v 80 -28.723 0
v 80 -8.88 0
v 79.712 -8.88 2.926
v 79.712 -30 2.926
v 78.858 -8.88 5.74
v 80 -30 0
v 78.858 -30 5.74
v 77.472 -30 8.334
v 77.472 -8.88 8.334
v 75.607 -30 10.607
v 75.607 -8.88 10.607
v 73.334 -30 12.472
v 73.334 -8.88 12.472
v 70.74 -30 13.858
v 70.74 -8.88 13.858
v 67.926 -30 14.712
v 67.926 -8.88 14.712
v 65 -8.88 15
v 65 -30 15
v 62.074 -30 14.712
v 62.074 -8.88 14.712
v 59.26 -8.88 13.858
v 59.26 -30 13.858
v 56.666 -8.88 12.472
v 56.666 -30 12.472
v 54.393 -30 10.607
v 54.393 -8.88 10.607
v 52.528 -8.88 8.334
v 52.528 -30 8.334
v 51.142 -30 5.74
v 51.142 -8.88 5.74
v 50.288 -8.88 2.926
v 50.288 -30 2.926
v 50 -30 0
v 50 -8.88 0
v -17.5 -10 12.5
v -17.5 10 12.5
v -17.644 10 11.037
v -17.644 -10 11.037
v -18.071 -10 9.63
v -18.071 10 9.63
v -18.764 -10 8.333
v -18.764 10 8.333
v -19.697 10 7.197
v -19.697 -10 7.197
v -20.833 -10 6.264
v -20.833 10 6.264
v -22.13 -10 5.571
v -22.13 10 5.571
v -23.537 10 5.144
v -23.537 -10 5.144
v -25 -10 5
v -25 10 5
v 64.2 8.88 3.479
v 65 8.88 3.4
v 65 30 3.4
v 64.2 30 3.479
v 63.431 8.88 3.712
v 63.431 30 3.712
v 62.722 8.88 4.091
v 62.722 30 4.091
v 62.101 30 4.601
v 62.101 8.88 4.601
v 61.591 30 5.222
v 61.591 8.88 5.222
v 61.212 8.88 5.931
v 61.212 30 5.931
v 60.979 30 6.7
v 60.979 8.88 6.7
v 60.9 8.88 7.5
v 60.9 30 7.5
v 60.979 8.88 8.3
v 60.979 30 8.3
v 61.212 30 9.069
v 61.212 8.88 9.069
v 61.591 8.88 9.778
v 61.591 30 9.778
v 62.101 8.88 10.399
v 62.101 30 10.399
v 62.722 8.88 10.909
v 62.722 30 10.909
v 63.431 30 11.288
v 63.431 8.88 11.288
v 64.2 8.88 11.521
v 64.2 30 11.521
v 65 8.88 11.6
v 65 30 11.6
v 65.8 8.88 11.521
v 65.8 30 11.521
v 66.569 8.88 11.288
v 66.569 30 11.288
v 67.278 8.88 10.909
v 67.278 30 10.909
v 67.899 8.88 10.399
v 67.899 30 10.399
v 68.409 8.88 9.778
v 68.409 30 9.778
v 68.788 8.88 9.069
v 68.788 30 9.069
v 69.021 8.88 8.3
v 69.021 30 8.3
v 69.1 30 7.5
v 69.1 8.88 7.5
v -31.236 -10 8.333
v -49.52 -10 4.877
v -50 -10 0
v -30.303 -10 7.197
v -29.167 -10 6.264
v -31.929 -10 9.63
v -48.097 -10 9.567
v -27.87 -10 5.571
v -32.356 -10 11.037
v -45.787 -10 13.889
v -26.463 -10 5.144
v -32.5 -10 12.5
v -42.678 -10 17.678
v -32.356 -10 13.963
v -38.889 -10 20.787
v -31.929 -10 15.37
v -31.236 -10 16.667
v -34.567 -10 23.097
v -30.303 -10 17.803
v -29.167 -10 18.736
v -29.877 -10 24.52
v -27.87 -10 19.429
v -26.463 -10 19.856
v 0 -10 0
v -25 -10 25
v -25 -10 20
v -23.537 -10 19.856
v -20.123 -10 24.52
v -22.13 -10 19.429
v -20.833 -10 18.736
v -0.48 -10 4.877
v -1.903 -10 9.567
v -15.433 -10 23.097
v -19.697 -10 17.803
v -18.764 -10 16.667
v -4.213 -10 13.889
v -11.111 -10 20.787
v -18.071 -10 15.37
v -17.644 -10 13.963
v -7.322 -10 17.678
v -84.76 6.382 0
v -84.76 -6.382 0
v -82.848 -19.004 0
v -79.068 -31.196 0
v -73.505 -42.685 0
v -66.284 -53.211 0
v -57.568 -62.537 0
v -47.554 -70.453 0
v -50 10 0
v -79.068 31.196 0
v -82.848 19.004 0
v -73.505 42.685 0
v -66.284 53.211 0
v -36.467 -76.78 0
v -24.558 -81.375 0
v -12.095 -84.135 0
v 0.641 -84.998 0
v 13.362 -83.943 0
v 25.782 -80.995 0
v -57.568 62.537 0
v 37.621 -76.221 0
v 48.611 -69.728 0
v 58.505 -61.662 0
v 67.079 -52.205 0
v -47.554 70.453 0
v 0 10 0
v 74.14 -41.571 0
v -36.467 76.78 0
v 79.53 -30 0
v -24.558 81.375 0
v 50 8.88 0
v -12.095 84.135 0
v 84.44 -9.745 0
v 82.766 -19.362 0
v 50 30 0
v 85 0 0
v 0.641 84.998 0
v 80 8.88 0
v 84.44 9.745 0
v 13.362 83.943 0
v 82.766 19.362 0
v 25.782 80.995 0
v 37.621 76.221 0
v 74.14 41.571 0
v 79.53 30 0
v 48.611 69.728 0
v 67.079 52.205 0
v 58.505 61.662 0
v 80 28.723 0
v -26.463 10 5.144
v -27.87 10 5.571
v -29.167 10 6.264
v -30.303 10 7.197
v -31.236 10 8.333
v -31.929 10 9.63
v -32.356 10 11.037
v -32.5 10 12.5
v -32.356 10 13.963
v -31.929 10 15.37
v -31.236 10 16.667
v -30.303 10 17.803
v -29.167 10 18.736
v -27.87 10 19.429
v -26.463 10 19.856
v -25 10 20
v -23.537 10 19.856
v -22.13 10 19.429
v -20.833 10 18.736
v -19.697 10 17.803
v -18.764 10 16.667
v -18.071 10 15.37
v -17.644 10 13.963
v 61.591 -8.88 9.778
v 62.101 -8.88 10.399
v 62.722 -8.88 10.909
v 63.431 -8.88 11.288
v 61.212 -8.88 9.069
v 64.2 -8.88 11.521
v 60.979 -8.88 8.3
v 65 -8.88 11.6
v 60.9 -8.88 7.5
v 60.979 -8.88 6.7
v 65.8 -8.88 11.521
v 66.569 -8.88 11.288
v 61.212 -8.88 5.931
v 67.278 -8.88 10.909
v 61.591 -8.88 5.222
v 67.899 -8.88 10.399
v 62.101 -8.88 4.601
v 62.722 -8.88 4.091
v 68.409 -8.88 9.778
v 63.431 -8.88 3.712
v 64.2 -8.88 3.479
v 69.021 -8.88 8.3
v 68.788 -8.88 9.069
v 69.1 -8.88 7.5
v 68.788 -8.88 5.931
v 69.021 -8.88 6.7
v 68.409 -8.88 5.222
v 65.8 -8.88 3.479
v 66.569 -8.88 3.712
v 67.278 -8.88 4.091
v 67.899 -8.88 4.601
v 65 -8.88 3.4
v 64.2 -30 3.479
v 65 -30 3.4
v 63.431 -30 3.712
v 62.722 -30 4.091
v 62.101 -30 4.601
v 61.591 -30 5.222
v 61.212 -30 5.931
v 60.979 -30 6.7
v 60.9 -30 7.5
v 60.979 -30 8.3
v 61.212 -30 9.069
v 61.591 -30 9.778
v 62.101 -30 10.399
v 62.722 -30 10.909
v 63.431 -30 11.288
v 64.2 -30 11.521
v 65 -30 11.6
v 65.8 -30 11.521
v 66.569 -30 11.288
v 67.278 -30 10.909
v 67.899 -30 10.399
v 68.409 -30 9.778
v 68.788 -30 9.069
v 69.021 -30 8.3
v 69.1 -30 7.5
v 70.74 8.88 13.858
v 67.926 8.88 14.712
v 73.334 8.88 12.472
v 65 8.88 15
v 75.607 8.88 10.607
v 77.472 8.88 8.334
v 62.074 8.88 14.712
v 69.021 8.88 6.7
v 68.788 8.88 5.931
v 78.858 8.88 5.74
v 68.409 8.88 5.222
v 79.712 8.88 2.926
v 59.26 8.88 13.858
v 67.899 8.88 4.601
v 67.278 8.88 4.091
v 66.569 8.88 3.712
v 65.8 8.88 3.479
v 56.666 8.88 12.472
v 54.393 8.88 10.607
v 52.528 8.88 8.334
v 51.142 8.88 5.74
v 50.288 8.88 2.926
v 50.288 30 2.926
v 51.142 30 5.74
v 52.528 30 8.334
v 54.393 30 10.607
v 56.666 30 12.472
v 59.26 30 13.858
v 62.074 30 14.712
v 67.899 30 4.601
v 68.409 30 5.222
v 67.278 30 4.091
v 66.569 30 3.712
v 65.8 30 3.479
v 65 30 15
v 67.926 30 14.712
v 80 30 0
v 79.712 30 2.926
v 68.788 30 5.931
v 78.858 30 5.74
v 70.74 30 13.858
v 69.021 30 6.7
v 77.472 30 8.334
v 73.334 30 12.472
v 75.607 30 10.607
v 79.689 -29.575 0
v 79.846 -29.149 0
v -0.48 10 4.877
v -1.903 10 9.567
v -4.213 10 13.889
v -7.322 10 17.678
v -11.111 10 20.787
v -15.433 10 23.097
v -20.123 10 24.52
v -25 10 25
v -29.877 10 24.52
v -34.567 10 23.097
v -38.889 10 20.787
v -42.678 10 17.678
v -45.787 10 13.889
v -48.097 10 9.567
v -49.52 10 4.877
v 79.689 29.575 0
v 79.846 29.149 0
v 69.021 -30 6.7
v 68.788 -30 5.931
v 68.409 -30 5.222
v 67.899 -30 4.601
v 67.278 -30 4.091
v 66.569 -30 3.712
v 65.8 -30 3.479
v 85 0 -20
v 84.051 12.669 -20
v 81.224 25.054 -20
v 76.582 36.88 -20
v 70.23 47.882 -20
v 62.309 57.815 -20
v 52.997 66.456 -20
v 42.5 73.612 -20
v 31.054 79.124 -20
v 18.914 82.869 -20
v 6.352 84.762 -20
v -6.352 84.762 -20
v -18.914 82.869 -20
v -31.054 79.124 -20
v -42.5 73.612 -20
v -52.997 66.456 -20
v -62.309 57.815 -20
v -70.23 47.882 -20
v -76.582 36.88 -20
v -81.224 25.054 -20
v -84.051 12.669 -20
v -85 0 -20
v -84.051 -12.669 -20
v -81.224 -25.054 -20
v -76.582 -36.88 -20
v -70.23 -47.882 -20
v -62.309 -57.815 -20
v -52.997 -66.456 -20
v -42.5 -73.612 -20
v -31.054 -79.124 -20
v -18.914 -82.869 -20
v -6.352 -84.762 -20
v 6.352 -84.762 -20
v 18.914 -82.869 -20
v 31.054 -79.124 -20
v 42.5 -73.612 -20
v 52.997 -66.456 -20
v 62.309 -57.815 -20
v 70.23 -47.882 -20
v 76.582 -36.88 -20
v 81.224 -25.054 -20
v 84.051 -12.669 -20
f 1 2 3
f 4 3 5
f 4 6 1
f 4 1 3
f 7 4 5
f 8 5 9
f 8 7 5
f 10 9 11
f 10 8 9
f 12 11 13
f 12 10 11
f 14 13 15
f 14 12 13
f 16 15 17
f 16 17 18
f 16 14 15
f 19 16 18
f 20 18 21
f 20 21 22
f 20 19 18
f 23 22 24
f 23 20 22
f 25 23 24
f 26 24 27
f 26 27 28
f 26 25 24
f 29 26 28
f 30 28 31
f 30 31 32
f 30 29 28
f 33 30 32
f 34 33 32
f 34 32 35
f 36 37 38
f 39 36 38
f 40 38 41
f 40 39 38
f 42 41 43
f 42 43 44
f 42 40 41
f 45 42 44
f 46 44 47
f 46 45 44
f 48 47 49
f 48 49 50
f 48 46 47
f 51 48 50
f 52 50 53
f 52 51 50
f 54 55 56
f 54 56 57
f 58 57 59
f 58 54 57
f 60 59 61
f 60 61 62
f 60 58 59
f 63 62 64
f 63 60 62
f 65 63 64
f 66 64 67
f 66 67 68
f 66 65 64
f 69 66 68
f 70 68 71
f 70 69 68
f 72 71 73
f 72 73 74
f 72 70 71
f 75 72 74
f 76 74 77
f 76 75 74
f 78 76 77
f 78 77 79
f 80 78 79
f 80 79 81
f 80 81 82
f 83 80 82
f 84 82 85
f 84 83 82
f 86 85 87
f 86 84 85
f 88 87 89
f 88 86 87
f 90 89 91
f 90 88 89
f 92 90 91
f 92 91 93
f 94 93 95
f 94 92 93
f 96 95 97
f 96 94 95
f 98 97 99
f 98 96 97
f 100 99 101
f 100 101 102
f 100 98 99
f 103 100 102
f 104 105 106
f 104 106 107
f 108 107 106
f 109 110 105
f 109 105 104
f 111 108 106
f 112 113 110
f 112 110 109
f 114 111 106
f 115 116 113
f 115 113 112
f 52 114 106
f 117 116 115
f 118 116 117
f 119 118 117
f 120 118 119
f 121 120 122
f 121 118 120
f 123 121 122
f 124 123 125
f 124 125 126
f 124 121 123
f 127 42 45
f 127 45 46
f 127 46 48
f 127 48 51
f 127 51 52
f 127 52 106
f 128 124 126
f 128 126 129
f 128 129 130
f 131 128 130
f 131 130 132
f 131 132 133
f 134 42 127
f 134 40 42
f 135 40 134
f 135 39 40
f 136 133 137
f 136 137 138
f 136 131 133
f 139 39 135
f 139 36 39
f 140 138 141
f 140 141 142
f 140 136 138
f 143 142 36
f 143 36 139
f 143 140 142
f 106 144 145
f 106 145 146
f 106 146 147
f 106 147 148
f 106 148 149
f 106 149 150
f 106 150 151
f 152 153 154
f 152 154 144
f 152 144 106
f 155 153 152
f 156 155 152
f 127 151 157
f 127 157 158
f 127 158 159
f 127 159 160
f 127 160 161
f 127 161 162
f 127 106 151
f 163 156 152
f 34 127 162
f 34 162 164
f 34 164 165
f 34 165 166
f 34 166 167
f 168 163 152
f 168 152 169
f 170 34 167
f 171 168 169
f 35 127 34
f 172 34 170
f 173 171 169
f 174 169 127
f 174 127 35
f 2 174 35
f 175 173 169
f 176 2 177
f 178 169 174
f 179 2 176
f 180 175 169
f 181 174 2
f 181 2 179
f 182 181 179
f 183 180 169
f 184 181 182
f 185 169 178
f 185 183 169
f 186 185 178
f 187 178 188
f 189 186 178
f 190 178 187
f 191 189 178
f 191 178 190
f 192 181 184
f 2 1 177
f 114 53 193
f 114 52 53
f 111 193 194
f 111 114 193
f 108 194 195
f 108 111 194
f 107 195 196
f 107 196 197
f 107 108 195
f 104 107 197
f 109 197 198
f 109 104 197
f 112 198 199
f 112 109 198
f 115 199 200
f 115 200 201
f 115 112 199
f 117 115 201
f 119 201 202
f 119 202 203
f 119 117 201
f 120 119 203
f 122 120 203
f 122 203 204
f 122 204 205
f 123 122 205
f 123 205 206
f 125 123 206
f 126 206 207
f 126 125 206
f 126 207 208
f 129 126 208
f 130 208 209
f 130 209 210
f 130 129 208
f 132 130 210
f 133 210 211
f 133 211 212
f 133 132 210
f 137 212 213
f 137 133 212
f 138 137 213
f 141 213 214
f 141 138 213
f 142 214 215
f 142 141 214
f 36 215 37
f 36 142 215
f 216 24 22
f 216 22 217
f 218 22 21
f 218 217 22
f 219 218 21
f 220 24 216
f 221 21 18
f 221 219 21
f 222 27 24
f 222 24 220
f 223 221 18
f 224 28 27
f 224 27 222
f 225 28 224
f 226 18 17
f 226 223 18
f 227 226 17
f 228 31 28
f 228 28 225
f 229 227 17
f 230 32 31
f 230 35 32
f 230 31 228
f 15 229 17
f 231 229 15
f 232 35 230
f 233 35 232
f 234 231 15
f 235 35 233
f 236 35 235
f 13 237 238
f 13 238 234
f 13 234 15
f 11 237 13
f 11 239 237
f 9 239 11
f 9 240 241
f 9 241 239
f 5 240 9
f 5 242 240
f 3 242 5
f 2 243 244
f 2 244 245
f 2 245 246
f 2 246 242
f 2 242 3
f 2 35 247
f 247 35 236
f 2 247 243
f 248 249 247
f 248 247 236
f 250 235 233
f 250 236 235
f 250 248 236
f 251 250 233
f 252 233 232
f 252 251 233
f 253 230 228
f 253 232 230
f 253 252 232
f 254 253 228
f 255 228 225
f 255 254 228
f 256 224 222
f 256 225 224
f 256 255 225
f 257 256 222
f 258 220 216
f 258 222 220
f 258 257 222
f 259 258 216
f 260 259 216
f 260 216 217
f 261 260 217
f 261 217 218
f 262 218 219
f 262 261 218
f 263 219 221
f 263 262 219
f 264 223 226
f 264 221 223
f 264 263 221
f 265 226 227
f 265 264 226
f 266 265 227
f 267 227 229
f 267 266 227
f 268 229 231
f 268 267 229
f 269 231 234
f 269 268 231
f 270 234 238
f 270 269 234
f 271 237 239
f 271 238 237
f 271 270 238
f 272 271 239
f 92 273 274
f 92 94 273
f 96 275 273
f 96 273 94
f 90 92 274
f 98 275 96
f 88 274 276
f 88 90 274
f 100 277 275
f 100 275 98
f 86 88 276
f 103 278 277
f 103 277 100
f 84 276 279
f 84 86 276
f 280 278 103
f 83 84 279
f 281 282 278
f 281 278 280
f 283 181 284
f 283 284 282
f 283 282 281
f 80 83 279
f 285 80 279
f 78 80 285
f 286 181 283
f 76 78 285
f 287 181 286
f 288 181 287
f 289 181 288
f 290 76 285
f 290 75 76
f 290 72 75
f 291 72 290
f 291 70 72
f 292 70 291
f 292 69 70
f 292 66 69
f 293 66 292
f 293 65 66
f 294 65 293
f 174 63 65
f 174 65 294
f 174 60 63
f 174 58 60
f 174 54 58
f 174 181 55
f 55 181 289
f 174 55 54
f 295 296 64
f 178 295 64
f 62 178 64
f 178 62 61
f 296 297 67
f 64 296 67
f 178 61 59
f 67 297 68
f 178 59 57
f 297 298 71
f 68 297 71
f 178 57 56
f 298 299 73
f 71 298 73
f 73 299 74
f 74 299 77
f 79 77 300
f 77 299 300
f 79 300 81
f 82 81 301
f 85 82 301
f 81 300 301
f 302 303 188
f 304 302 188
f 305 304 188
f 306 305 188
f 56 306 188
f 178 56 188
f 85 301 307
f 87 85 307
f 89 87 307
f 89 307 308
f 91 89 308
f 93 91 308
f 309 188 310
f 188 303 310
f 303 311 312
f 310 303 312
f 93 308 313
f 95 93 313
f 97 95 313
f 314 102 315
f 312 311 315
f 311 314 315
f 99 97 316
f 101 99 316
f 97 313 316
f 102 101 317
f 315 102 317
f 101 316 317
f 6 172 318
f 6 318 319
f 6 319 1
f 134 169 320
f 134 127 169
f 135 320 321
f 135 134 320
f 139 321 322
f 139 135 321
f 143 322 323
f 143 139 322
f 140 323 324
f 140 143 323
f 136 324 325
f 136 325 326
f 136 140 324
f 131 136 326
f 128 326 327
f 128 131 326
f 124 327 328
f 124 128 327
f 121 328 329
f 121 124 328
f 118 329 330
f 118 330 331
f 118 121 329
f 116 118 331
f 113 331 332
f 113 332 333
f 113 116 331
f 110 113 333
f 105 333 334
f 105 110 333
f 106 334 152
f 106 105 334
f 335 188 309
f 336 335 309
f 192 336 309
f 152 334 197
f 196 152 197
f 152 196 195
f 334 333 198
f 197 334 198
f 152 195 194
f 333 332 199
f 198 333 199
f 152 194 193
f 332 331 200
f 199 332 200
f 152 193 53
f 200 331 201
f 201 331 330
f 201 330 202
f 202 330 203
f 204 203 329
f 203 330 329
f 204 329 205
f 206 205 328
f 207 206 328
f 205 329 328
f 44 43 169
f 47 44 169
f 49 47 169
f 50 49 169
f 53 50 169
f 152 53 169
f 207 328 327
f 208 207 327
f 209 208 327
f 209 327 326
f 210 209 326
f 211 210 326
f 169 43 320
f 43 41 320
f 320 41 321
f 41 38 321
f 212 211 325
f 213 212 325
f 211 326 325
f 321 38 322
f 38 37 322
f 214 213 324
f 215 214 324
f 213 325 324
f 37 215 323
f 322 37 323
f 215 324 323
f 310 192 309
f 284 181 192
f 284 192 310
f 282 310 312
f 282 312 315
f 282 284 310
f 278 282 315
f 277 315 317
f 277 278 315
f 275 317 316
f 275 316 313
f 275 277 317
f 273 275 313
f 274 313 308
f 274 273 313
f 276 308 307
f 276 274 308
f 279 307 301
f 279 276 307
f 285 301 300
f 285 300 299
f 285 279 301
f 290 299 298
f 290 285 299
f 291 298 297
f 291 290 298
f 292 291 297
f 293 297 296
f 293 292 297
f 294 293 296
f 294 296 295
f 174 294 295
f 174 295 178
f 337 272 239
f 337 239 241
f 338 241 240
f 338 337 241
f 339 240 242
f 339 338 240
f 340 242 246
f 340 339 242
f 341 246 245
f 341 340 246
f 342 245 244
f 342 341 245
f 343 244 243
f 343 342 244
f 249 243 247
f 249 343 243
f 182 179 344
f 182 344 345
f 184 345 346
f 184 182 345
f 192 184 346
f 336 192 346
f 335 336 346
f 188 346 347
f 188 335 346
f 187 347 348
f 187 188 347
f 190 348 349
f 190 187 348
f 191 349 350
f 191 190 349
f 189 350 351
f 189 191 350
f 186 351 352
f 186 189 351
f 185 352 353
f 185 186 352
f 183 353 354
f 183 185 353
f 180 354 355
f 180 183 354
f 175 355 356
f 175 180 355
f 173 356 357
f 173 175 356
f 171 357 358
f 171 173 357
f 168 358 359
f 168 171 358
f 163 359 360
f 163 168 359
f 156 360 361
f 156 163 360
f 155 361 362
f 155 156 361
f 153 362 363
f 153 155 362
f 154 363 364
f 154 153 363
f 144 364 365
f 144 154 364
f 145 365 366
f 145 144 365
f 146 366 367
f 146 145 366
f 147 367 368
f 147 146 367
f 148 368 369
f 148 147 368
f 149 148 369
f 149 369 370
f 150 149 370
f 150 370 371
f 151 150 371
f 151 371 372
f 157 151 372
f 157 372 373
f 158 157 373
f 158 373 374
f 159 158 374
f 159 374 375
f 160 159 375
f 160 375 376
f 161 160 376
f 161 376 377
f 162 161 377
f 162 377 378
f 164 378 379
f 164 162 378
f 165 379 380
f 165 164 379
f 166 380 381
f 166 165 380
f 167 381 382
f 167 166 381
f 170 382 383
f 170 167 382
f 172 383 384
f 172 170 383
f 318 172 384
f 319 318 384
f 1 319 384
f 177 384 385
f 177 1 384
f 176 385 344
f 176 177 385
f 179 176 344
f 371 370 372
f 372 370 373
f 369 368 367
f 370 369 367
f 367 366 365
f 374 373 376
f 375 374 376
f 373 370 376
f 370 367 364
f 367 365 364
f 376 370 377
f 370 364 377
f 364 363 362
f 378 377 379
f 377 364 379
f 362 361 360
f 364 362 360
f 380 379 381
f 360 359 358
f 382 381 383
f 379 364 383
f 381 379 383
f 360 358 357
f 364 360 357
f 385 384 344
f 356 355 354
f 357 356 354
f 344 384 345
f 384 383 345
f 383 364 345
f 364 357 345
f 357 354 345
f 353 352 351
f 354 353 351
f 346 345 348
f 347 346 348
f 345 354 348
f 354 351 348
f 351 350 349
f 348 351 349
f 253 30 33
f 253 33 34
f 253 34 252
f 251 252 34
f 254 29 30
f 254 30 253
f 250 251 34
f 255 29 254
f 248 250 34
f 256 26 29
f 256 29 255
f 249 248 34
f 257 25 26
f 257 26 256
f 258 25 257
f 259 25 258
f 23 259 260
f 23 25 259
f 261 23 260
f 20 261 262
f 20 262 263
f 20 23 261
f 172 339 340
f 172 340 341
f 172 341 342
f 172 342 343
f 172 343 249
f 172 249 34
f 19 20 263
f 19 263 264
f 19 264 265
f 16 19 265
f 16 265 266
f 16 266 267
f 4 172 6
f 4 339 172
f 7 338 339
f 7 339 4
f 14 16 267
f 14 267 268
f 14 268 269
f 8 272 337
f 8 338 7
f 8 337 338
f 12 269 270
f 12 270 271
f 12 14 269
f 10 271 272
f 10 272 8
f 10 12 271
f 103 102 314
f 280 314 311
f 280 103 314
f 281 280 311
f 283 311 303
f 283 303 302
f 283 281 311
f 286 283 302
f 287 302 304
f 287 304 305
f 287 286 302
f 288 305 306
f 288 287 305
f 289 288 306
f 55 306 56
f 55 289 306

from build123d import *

# Parameters (mm, degrees)
F0_R          = 85
F1_DEPTH      = 20
F3_DEPTH      = 10
F3_DEPTH_BACK = 10
F5_DEPTH      = 30
F5_DEPTH_BACK = 30
F7_DEPTH      = 25


with BuildPart() as f1:
    # F0 (on Top) → F1 (new body)
    with BuildSketch(Plane.XY):
        Circle(F0_R)
    extrude(amount=-F1_DEPTH)

    # F2 (on Front) → F3 (join, two sides)
    with BuildSketch(Plane.XZ) as f3_sk:
        with BuildLine():
            ThreePointArc((-17.5, 12.5), (-30.303301, 17.803301), (-25, 5))
            ThreePointArc((-25, 5), (-19.696699, 7.196699), (-17.5, 12.5))
        make_face()
        with BuildLine():
            Line((-25, 0), (0, 0))
            ThreePointArc((0, 0), (-25, 25), (-50, 0))
            Line((-50, 0), (-25, 0))
        make_face()
        with BuildLine():
            ThreePointArc((-17.5, 12.5), (-19.696699, 7.196699), (-25, 5))
            ThreePointArc((-25, 5), (-30.303301, 17.803301), (-17.5, 12.5))
        make_face(mode=Mode.SUBTRACT)
    extrude(amount=F3_DEPTH)
    extrude(f3_sk.sketch, amount=-F3_DEPTH_BACK)

    # F4 (on Front) → F5 (join, two sides)
    with BuildSketch(Plane.XZ) as f5_sk:
        with BuildLine():
            ThreePointArc((69.1, 7.5), (62.100862, 10.399138), (65, 3.4))
            ThreePointArc((65, 3.4), (67.899138, 4.600862), (69.1, 7.5))
        make_face()
        with BuildLine():
            ThreePointArc((80, 0), (65, 15), (50, 0))
            Line((50, 0), (65, 0))
            Line((65, 0), (80, 0))
        make_face()
        with BuildLine():
            ThreePointArc((69.1, 7.5), (67.899138, 4.600862), (65, 3.4))
            ThreePointArc((65, 3.4), (62.100862, 10.399138), (69.1, 7.5))
        make_face(mode=Mode.SUBTRACT)
    extrude(amount=F5_DEPTH)
    extrude(f5_sk.sketch, amount=-F5_DEPTH_BACK)

    # F6 (on Top) → F7 (cut)
    with BuildSketch(Plane.XY):
        Polygon((0, 8.88), (0, 0), (0, -8.88), (150, -8.88), (150, 8.88), align=None)
    extrude(amount=F7_DEPTH, mode=Mode.SUBTRACT)


solid = f1.part
